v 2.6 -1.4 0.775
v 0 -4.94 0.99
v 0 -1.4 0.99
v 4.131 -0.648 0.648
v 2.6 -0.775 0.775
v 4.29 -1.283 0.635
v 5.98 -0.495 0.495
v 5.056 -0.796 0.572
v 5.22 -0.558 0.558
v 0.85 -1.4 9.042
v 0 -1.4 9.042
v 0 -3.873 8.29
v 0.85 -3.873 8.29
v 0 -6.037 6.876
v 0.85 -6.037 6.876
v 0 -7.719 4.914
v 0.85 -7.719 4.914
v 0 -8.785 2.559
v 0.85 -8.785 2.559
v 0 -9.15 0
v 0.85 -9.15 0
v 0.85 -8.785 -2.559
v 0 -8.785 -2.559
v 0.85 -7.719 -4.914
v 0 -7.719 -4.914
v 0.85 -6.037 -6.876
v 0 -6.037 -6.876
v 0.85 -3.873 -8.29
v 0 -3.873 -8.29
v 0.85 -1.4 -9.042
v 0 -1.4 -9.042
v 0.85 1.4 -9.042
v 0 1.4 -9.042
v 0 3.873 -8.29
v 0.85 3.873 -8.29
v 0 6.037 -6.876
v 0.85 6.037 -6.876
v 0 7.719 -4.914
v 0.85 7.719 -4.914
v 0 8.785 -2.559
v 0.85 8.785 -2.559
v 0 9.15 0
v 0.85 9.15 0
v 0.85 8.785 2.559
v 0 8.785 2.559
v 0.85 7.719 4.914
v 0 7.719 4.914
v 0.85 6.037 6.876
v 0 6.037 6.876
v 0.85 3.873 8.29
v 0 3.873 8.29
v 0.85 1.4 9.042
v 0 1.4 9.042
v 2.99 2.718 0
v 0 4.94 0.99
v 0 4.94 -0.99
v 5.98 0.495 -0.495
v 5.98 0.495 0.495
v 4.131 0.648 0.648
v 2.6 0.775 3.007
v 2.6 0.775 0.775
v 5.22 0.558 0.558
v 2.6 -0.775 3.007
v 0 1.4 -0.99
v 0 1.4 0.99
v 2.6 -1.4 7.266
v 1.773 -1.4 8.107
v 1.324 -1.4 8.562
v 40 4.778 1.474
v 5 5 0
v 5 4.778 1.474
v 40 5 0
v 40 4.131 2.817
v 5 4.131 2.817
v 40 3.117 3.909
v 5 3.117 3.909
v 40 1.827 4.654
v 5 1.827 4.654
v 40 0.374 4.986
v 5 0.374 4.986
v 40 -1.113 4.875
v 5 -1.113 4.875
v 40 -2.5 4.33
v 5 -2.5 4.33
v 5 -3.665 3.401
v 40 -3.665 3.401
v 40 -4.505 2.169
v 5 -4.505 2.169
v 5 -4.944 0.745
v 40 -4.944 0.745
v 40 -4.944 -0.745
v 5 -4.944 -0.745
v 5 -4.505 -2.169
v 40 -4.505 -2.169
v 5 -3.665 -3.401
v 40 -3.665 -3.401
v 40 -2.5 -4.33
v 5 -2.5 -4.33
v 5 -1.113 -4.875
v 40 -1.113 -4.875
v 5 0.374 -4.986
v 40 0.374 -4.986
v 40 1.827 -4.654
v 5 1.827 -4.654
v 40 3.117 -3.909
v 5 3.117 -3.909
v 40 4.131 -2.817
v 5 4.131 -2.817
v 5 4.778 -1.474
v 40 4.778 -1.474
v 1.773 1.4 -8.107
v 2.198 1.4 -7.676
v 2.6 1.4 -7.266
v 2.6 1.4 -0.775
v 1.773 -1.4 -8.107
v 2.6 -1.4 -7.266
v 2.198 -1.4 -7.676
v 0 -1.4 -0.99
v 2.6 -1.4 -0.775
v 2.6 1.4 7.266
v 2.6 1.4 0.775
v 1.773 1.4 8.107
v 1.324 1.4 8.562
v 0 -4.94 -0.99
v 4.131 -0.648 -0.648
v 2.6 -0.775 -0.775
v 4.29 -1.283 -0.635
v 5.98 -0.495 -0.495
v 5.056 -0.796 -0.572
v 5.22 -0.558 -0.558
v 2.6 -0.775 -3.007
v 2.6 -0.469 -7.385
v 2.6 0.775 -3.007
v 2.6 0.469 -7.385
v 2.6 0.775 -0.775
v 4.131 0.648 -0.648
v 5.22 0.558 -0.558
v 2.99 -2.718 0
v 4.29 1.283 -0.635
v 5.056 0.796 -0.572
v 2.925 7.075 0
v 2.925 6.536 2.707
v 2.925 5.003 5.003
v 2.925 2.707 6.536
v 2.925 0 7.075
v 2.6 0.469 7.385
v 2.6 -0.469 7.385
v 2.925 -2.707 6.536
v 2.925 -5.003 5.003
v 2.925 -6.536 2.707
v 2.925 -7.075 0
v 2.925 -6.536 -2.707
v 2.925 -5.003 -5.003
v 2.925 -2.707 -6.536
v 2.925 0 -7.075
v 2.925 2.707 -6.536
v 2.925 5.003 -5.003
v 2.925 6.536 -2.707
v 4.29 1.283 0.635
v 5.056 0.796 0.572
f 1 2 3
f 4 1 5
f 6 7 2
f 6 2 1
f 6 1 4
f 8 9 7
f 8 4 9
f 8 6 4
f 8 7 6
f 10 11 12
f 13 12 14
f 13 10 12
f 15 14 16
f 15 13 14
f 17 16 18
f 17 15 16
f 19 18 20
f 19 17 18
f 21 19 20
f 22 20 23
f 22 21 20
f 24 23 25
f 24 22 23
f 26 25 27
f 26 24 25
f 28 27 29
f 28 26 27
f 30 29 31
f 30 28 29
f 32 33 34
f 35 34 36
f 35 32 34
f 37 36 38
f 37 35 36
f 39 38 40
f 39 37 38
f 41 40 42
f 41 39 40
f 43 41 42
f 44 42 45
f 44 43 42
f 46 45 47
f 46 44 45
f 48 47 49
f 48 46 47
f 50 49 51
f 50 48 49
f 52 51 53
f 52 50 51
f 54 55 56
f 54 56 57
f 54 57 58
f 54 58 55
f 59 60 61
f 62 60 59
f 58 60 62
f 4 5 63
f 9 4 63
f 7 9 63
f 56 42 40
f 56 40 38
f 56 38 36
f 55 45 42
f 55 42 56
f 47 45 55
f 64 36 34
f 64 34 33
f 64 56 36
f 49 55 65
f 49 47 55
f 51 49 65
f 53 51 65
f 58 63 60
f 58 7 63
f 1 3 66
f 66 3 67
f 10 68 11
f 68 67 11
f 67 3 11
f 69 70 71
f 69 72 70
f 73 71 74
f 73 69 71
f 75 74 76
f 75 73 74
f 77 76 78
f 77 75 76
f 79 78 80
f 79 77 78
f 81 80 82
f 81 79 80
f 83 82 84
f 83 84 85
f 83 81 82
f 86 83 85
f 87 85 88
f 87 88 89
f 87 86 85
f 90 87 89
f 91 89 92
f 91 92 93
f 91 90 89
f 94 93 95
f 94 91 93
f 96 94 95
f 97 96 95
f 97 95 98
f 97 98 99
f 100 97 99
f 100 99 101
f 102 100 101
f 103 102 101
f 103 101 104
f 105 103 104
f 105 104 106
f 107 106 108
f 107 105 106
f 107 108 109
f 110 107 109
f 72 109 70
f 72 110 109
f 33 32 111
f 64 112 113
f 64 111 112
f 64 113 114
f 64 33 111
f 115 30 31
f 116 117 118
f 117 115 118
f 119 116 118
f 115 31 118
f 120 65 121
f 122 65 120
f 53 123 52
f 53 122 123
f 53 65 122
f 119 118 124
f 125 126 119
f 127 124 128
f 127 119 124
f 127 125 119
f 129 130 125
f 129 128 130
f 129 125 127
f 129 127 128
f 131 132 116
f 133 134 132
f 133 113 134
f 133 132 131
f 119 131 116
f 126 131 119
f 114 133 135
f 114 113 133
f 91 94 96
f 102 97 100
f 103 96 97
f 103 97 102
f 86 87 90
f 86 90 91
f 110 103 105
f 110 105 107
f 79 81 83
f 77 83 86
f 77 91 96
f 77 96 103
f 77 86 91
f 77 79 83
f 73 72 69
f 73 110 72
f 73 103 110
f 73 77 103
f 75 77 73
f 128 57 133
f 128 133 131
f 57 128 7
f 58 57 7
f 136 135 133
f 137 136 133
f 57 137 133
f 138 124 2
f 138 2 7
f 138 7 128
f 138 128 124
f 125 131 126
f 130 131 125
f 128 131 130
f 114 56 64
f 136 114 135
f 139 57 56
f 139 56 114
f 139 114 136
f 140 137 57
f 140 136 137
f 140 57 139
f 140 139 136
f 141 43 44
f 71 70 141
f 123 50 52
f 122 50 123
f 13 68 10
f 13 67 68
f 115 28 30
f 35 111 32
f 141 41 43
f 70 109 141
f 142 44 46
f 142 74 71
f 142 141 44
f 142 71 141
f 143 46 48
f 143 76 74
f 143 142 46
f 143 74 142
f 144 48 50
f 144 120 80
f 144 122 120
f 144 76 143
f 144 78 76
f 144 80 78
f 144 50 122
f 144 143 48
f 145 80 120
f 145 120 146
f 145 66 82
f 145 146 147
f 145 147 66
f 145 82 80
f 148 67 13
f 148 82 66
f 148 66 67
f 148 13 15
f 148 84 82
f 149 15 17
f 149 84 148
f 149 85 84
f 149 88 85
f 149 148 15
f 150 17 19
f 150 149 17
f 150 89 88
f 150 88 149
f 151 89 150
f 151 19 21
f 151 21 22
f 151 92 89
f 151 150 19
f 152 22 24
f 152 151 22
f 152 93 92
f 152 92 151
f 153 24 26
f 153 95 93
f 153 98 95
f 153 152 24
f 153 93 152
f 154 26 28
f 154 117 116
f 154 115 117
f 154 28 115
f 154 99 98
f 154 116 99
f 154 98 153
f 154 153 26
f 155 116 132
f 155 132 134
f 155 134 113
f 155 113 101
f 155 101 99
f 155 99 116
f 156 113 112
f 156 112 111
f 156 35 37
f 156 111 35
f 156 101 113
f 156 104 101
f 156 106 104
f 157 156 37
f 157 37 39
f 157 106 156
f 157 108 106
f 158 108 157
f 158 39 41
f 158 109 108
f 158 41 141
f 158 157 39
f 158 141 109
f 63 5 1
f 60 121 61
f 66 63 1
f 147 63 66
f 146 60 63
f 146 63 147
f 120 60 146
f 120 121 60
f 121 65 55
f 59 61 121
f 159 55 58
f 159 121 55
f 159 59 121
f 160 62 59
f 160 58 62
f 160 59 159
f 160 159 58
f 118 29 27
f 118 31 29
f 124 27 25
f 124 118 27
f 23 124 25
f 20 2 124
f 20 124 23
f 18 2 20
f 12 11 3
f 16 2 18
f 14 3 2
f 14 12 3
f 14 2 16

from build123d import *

# Parameters (mm, degrees)
SKETCH2_W         = 18.3
SKETCH2_H         = 2.8
SLOT_DEPTH        = 2.6
SKETCH3_W         = 1.98
SKETCH3_H         = 9.88
SKETCH4_W         = 0.99
SKETCH4_H         = 0.99
CIRPATTERN1_COUNT = 2
CIRPATTERN1_ANGLE = 90


with BuildPart() as part:
    # BodySke → Base-Revolve (revolve)
    with BuildSketch(Plane.XY):
        Polygon((0, 0), (0, 9.15), (0.85, 9.15), (5, 5), (40, 5), (40, 0), align=None)
    revolve(axis=Axis((-6.35, 0, 0), (1, 0, 0)))

    # Sketch2 → Slot (cut)
    with BuildSketch(Plane.ZY):
        Rectangle(SKETCH2_W, SKETCH2_H)
    extrude(amount=-SLOT_DEPTH, mode=Mode.SUBTRACT)

    # Sketch3 → Cross section 0
    with BuildSketch(Plane.ZY):
        Rectangle(SKETCH3_W, SKETCH3_H)
    # Sketch4 → Cross section 1
    with BuildSketch(Plane.ZY.offset(-5.98)):
        Rectangle(SKETCH4_W, SKETCH4_H)
    cross = loft(mode=Mode.SUBTRACT)

    # CirPattern1: Cross ×2 about axis
    cirpattern1_axis = Axis((0, 0, 0), (1, 0, 0))
    for i in range(1, CIRPATTERN1_COUNT):
        add(cross.rotate(cirpattern1_axis, i * CIRPATTERN1_ANGLE / (CIRPATTERN1_COUNT - 1)), mode=Mode.SUBTRACT)


solid = part.part
